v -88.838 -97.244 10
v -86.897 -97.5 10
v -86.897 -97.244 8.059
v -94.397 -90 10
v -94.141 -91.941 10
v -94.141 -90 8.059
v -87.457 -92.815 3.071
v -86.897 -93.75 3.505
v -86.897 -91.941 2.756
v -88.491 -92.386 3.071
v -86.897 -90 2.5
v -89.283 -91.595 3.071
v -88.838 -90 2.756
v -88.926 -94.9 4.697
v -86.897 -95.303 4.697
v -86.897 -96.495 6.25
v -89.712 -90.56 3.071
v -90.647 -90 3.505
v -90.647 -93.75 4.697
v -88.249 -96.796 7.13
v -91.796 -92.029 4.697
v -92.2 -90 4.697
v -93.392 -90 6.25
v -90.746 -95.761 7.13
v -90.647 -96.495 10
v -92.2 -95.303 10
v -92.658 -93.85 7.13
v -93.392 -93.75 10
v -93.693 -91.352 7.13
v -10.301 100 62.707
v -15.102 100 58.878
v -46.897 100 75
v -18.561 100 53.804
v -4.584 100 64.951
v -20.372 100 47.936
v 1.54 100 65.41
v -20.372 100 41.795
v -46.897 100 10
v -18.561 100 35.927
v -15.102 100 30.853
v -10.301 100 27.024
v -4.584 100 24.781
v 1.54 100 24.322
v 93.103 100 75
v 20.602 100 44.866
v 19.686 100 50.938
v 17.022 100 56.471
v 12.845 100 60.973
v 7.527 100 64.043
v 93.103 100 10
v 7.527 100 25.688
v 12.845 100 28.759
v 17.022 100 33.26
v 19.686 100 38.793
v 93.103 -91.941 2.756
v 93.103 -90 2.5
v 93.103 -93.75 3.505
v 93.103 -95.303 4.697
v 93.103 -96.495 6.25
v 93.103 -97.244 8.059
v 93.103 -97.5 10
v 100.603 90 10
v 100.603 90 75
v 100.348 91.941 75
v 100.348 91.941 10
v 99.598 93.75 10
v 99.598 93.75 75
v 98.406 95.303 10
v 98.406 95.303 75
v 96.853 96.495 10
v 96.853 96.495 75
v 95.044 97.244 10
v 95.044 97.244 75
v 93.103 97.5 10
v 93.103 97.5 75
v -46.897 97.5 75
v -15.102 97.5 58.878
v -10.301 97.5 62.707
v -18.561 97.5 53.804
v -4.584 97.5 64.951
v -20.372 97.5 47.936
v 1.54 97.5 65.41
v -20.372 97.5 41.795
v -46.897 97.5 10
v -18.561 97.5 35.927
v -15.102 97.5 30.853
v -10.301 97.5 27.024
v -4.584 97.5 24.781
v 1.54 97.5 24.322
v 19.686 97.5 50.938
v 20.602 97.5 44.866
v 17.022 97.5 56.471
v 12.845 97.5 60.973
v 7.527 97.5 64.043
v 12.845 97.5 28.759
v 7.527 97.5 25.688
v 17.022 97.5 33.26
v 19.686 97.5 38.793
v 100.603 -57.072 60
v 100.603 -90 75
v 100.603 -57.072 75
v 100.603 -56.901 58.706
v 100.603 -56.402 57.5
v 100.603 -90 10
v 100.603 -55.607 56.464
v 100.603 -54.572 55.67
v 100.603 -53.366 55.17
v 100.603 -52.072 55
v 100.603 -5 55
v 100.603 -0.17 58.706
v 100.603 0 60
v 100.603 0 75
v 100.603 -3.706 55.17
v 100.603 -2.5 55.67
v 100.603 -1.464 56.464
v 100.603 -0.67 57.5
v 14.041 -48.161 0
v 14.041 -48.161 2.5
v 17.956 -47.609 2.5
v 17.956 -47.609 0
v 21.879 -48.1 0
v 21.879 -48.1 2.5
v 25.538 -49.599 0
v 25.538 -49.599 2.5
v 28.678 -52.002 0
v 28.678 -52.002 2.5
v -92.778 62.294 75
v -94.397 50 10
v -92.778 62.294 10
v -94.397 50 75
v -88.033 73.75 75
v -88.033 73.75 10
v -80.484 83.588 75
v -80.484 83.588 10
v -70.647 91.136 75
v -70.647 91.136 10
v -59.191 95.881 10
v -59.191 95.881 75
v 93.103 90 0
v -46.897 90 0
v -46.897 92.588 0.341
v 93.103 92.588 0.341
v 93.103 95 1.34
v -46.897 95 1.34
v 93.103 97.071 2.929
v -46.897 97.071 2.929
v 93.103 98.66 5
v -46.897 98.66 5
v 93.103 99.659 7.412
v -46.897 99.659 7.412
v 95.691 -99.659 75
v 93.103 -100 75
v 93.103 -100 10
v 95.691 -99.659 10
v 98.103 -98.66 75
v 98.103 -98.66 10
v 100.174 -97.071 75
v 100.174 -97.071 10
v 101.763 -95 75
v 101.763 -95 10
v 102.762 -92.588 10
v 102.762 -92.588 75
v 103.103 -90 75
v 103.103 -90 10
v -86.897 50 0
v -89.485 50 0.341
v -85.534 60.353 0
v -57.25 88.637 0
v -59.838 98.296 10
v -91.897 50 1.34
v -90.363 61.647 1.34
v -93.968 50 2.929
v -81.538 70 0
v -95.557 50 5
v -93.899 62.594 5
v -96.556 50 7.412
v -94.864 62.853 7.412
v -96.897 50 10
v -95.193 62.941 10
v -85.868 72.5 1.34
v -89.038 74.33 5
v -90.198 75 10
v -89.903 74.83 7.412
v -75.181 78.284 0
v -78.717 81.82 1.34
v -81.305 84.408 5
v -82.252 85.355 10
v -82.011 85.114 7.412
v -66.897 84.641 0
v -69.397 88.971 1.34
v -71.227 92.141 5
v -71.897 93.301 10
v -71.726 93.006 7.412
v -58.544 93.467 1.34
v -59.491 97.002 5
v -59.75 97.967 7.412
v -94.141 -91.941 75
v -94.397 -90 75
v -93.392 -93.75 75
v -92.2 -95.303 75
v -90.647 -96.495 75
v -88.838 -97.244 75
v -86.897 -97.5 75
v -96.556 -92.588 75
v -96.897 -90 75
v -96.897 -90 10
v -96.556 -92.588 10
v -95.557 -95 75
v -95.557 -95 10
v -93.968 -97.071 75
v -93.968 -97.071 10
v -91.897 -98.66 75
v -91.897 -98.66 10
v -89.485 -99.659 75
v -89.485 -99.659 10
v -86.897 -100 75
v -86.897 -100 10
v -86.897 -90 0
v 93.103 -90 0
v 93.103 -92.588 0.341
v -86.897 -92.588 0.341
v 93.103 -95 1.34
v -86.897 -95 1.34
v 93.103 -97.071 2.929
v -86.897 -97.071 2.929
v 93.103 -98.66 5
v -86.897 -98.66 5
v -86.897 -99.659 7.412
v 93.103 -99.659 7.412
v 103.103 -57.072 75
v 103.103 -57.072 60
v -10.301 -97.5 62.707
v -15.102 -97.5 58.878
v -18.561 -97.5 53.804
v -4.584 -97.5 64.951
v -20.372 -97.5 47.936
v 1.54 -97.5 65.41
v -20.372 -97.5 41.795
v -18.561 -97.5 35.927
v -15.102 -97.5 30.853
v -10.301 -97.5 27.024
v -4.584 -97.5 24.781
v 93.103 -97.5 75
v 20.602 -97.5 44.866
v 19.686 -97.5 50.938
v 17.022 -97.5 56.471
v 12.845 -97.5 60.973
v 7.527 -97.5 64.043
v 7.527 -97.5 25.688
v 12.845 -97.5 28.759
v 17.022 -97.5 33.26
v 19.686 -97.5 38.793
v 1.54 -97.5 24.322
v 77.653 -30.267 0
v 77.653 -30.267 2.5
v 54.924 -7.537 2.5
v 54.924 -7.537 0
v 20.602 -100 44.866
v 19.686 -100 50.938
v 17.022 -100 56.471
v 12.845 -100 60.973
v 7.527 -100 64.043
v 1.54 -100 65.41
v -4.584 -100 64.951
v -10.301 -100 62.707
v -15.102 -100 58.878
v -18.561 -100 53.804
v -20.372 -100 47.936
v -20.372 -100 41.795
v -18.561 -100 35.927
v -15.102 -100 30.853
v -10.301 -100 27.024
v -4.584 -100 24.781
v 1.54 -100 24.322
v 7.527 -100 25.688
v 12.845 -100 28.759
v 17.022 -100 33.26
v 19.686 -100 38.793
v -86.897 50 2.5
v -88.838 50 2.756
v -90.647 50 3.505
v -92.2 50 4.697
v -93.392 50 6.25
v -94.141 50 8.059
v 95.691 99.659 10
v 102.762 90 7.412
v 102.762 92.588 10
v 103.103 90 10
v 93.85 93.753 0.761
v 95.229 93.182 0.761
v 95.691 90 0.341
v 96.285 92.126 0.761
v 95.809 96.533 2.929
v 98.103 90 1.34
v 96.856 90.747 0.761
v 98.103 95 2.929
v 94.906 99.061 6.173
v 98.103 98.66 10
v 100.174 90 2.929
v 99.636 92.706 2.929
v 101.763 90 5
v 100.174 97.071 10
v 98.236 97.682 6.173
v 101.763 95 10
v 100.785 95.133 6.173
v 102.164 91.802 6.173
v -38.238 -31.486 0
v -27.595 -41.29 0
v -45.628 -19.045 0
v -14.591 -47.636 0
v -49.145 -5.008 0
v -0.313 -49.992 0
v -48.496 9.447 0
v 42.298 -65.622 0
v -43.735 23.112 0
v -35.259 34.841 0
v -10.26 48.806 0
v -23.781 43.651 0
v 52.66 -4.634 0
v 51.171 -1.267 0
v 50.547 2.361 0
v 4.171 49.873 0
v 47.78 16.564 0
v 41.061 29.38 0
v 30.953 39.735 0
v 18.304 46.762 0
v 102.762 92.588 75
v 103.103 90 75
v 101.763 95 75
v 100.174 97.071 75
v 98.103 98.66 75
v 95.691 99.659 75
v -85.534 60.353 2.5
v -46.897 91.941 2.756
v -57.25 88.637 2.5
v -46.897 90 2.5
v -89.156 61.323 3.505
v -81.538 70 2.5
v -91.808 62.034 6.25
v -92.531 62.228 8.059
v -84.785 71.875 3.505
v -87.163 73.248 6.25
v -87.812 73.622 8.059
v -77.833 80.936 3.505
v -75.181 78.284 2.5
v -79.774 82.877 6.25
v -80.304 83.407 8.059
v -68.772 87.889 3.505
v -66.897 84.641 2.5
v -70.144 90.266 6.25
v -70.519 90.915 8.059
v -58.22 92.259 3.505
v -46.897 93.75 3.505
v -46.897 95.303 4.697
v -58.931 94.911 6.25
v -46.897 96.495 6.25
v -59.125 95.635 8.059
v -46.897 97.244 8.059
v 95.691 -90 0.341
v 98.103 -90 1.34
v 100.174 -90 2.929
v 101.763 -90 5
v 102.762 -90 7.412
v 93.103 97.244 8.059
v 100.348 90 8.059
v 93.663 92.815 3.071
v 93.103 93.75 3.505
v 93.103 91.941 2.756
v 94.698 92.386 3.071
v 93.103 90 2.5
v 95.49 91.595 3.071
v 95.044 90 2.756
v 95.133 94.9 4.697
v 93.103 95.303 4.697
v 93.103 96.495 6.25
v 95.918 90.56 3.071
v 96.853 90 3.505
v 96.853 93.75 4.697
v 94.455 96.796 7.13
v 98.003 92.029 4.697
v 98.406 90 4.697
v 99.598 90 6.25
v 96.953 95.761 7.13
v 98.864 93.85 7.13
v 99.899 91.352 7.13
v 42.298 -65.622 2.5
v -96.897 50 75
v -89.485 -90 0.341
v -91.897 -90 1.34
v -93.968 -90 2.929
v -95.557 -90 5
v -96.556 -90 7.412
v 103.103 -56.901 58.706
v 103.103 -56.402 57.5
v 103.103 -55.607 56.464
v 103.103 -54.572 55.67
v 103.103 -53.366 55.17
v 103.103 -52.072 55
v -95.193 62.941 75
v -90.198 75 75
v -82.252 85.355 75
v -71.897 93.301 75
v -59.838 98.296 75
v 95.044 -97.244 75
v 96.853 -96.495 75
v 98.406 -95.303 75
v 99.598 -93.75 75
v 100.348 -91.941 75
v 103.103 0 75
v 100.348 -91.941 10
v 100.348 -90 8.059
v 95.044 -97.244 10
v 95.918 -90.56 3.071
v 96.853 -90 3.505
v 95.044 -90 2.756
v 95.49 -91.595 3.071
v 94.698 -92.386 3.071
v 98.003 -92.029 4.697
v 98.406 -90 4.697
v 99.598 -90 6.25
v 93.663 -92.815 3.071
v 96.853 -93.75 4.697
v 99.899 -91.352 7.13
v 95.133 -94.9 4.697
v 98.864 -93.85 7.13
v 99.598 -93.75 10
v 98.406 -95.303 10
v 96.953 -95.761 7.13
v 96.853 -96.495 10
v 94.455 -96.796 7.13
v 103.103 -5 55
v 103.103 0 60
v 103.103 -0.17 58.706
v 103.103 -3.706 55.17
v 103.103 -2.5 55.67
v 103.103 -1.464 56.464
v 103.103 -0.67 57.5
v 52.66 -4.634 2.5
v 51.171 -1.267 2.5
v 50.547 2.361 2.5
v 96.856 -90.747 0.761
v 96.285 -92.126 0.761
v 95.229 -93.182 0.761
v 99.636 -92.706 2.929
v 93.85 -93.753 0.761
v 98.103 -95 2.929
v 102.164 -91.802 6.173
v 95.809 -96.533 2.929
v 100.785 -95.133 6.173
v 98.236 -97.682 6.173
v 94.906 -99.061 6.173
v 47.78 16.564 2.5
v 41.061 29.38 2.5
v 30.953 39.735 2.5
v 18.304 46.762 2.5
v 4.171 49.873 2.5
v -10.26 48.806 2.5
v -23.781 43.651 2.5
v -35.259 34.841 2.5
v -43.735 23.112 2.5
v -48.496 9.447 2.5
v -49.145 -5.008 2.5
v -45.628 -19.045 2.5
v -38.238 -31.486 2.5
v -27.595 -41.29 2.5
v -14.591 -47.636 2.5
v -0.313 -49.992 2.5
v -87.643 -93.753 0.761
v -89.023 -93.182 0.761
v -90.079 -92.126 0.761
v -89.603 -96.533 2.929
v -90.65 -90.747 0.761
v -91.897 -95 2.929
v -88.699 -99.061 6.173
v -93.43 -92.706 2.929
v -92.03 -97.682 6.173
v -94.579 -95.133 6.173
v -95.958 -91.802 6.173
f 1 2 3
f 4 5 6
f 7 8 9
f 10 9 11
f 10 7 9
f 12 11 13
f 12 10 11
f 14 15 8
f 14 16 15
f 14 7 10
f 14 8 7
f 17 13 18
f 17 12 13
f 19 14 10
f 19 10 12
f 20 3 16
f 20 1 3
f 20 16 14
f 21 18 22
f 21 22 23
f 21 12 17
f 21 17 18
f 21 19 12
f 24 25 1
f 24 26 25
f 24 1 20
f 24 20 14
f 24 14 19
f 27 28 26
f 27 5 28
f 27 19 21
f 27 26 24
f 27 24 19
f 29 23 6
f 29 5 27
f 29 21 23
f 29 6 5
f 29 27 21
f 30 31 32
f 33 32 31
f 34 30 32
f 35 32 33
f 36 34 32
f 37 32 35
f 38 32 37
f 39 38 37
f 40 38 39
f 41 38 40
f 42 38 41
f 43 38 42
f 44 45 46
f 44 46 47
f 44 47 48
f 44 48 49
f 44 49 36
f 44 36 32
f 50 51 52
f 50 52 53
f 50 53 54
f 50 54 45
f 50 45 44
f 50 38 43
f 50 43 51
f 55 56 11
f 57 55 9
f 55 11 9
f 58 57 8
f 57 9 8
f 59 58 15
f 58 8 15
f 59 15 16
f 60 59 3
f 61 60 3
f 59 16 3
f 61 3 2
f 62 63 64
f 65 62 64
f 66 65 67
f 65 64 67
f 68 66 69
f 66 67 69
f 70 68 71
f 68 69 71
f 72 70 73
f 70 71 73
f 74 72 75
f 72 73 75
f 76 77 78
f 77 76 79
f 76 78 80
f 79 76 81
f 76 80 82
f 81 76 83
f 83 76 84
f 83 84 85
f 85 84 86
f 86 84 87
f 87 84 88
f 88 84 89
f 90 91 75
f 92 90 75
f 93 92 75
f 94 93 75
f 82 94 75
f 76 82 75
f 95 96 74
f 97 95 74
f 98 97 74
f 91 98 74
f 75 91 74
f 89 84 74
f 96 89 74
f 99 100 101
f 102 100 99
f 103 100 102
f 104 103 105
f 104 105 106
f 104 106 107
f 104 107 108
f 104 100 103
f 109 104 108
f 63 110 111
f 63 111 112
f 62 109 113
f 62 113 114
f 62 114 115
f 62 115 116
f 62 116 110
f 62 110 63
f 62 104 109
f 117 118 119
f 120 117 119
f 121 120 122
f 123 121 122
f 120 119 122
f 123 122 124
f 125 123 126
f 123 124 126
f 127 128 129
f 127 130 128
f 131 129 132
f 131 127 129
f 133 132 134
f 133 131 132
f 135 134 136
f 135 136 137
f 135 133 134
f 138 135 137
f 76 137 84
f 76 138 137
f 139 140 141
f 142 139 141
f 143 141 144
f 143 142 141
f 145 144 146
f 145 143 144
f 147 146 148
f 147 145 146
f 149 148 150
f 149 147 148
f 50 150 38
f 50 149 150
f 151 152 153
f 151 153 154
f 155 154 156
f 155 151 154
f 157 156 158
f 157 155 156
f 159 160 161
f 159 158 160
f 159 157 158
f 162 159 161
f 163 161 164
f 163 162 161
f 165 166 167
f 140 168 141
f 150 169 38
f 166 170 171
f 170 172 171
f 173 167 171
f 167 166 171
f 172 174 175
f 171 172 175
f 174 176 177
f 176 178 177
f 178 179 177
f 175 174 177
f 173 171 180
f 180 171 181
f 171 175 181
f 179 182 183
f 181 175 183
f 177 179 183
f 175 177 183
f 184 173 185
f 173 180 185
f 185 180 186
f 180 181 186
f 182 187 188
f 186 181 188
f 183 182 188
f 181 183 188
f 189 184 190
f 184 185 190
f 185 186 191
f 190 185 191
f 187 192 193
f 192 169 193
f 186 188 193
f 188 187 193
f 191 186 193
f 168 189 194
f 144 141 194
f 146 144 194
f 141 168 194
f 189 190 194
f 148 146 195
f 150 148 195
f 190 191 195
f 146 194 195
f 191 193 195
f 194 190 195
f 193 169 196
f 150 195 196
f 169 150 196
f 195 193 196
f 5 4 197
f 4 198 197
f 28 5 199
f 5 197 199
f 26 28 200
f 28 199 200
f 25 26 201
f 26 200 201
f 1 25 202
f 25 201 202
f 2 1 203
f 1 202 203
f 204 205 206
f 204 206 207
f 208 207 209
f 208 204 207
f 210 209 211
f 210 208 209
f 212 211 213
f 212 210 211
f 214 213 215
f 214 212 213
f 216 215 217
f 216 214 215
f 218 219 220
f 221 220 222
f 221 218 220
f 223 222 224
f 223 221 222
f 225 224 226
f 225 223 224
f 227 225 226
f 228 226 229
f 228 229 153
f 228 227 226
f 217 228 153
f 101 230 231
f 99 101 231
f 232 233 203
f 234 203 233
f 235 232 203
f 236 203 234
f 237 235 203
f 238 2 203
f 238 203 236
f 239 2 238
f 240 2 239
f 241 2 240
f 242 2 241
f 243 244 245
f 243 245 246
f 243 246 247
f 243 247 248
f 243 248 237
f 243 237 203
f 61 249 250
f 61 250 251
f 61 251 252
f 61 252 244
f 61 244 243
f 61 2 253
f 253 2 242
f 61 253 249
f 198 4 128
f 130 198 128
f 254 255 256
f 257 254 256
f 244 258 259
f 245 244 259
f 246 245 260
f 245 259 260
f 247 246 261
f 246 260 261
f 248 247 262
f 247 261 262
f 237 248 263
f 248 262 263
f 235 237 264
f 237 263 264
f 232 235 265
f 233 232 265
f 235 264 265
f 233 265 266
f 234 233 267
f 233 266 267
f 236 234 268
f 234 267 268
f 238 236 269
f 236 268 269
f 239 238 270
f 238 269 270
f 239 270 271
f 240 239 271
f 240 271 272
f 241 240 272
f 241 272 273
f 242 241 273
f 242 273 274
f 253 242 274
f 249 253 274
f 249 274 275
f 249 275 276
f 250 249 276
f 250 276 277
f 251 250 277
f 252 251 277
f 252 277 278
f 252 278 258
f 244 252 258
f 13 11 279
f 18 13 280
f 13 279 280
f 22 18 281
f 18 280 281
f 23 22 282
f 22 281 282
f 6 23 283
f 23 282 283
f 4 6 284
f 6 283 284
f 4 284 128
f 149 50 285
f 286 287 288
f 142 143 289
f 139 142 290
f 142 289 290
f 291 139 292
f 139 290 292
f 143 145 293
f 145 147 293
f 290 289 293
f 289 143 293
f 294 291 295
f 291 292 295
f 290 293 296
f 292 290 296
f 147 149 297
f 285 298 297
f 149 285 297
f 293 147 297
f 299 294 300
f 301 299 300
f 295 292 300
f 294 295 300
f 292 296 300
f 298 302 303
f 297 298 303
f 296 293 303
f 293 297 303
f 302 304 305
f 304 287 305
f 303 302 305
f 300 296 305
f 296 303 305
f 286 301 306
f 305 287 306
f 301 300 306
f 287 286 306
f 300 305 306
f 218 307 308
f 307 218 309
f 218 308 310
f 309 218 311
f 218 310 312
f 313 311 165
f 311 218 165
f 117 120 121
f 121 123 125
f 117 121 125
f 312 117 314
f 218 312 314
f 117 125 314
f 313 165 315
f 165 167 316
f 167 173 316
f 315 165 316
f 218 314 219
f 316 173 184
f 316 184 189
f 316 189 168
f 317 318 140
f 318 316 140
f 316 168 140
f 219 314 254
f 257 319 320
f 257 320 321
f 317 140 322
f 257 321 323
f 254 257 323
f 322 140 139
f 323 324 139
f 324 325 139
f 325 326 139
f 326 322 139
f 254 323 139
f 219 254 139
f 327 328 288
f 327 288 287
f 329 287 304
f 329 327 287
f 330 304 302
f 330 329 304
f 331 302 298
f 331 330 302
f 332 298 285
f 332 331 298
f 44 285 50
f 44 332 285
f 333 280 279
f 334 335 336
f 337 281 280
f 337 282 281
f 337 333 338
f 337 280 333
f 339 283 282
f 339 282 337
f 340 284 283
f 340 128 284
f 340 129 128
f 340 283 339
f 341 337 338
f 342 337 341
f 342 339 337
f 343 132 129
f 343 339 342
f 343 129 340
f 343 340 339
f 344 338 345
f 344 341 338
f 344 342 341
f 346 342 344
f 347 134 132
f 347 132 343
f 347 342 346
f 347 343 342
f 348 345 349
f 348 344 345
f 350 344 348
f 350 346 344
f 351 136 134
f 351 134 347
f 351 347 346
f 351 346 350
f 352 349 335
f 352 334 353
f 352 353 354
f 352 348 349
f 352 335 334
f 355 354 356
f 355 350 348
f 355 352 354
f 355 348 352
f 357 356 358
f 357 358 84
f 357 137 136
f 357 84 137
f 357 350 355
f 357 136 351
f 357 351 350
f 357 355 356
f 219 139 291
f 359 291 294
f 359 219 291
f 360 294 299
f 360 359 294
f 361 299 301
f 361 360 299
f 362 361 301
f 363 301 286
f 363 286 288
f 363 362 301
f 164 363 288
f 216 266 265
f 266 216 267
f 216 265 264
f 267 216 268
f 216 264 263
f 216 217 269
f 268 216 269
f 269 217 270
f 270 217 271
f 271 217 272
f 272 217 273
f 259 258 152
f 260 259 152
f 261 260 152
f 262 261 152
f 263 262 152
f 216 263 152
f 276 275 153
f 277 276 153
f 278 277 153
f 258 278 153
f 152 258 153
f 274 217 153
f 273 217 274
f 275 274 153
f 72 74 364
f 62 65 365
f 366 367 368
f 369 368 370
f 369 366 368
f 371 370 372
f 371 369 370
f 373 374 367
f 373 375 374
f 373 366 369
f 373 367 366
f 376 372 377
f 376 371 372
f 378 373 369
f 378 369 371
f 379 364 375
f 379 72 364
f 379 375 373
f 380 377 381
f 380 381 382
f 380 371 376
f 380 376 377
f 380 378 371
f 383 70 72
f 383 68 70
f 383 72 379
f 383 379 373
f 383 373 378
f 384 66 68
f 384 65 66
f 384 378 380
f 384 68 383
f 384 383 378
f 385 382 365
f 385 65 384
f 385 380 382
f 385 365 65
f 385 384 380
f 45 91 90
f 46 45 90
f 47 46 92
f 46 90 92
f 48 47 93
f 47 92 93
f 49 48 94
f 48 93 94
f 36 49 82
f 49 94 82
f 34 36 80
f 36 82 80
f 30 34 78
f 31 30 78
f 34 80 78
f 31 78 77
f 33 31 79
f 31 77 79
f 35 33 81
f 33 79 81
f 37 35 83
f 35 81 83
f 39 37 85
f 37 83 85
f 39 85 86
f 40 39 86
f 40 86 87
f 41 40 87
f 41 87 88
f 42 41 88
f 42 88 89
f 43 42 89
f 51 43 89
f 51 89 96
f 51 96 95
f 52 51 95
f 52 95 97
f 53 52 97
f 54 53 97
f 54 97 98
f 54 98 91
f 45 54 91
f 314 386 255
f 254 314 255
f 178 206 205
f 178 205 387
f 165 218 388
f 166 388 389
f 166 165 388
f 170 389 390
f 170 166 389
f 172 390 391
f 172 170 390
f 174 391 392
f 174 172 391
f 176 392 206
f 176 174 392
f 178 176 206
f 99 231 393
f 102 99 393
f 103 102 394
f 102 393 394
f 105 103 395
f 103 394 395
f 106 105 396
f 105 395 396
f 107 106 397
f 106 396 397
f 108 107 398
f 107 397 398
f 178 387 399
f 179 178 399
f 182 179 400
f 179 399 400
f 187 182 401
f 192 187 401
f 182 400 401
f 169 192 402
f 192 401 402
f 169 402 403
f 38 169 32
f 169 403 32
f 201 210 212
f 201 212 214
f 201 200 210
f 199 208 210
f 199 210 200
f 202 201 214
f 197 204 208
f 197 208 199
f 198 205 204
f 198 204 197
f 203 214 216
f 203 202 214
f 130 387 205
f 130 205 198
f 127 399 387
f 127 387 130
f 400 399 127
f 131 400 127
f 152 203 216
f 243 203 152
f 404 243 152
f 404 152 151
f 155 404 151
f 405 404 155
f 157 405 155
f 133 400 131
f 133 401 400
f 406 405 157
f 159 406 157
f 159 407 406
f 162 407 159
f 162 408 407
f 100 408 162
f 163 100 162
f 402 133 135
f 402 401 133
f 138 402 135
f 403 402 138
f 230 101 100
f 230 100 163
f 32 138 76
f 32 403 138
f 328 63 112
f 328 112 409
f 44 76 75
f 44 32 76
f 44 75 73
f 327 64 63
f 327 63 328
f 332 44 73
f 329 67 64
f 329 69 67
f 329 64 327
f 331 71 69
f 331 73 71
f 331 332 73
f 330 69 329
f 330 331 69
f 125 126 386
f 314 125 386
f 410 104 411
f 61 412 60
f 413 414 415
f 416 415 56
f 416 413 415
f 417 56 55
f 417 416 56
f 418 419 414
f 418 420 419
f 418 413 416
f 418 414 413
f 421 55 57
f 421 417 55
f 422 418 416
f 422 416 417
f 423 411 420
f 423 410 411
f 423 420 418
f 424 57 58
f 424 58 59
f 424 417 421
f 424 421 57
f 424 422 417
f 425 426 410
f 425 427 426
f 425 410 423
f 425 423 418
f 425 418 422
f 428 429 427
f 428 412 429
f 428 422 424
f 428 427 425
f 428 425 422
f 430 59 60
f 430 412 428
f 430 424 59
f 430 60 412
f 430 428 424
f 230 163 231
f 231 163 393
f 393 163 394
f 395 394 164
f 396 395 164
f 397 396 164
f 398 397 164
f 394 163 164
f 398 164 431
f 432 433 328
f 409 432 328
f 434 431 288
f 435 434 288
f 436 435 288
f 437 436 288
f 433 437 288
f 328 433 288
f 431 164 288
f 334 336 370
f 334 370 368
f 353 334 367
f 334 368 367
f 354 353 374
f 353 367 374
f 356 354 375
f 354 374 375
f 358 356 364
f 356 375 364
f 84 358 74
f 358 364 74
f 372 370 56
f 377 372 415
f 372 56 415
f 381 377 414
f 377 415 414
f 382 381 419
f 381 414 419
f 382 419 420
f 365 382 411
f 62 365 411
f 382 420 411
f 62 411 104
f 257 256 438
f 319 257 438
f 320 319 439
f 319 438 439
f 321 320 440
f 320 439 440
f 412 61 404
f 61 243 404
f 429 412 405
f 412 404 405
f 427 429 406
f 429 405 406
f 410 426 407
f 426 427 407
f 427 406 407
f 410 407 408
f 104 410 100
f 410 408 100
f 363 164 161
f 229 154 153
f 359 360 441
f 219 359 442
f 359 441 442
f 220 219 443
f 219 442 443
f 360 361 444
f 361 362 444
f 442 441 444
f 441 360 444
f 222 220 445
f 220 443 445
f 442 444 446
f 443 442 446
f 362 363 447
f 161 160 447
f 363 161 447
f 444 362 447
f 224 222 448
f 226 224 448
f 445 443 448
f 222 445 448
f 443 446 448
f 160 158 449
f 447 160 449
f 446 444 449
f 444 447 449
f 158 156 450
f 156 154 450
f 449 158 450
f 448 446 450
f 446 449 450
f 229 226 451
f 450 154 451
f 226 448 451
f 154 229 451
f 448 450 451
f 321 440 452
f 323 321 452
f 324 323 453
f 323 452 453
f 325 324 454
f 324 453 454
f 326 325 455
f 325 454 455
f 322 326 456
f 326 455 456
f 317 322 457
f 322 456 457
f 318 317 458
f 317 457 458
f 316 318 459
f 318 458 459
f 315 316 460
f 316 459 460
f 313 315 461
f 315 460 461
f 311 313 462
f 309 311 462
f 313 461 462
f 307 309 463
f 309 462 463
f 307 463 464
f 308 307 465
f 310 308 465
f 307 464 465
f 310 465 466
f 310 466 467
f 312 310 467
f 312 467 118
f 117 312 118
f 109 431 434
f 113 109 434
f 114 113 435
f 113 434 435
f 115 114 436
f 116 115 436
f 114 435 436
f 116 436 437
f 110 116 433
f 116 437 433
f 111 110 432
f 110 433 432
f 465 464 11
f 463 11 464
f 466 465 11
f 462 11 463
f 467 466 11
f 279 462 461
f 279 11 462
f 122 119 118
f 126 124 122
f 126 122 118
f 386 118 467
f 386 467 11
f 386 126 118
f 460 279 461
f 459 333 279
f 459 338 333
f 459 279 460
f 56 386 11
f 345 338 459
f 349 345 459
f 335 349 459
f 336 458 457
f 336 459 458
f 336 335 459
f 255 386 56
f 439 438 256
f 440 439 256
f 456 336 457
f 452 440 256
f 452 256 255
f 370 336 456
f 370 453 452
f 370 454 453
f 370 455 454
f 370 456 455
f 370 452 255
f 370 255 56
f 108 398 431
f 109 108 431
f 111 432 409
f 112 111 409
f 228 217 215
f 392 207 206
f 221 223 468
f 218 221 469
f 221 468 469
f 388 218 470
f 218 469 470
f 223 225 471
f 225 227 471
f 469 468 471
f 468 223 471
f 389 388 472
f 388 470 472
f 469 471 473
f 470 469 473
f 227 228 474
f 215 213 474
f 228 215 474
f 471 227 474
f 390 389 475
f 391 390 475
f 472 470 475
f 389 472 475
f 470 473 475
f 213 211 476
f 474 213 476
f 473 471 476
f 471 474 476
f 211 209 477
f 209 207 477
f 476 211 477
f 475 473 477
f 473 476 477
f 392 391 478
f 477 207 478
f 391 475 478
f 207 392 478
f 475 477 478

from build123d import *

# Parameters (mm, degrees)
F0_W      = 200
F0_H      = 200
F1_DEPTH  = 75
F2_R      = 10
F3_R      = 50
F4_R      = 10
F5_T      = -2.5
F6_R      = 20.601636
F7_DEPTH  = 200.001
F9_DEPTH  = 2.5
F11_DEPTH = 2.5


with BuildPart() as f1:
    # F0 (on Top) → F1 (new body)
    with BuildSketch(Plane.XY):
        with Locations((3.103165, 0)):
            Rectangle(F0_W, F0_H)
    extrude(amount=F1_DEPTH)

    # F2
    f2_edges = [f1.edges().sort_by_distance(p)[0] for p in [
        (-96.896835, -100, 37.5),
        (103.103165, -100, 37.5),
        (103.103165, 100, 37.5),
    ]]
    fillet(f2_edges, radius=F2_R)

    # F3
    f3_edges = [f1.edges().sort_by_distance(p)[0] for p in [
        (-96.896835, 100, 37.5),
    ]]
    fillet(f3_edges, radius=F3_R)

    # F4
    f4_edges = [f1.edges().sort_by_distance(p)[0] for p in [
        (23.103165, 100, 0),
    ]]
    fillet(f4_edges, radius=F4_R)

    # F5
    f5_openings = [f1.faces().sort_by_distance(p)[0] for p in [
        (4.259549, -1.156383, 75),
    ]]
    offset(amount=F5_T, openings=f5_openings)

    # F6 (on face) → F7 (cut, through all)
    with BuildSketch(Plane.XZ.offset(100)):
        with Locations((0, 44.865675)):
            Circle(F6_R)
    extrude(amount=-F7_DEPTH, mode=Mode.SUBTRACT)

    # F8 (on face) → F9 (cut, through all)
    with BuildSketch(Plane.XY.offset(2.5)):
        with BuildLine():
            ThreePointArc((54.924048, -7.537108), (51.811896, -2.99646), (50.547384, 2.361149))
            ThreePointArc((50.547384, 2.361149), (-39.923575, 29.284524), (14.04054, -48.160533))
            ThreePointArc((14.04054, -48.160533), (21.879419, -48.100018), (28.678354, -52.002092))
            Line((28.678354, -52.002092), (42.298151, -65.621889))
            Line((42.298151, -65.621889), (77.65349, -30.26655))
            Line((77.65349, -30.26655), (54.924048, -7.537108))
        make_face()
    extrude(amount=-F9_DEPTH, mode=Mode.SUBTRACT)

    # F10 (on face) → F11 (cut, through all)
    with BuildSketch(Plane.YZ.offset(103.103165)):
        with BuildLine():
            ThreePointArc((-57.071527, 60), (-55.607061, 56.464466), (-52.071527, 55))
            Line((-52.071527, 55), (-5, 55))
            ThreePointArc((-5, 55), (-1.464466, 56.464466), (0, 60))
            Line((0, 60), (0, 75))
            Line((0, 75), (-57.071527, 75))
            Line((-57.071527, 75), (-57.071527, 60))
        make_face()
    extrude(amount=-F11_DEPTH, mode=Mode.SUBTRACT)


solid = f1.part
